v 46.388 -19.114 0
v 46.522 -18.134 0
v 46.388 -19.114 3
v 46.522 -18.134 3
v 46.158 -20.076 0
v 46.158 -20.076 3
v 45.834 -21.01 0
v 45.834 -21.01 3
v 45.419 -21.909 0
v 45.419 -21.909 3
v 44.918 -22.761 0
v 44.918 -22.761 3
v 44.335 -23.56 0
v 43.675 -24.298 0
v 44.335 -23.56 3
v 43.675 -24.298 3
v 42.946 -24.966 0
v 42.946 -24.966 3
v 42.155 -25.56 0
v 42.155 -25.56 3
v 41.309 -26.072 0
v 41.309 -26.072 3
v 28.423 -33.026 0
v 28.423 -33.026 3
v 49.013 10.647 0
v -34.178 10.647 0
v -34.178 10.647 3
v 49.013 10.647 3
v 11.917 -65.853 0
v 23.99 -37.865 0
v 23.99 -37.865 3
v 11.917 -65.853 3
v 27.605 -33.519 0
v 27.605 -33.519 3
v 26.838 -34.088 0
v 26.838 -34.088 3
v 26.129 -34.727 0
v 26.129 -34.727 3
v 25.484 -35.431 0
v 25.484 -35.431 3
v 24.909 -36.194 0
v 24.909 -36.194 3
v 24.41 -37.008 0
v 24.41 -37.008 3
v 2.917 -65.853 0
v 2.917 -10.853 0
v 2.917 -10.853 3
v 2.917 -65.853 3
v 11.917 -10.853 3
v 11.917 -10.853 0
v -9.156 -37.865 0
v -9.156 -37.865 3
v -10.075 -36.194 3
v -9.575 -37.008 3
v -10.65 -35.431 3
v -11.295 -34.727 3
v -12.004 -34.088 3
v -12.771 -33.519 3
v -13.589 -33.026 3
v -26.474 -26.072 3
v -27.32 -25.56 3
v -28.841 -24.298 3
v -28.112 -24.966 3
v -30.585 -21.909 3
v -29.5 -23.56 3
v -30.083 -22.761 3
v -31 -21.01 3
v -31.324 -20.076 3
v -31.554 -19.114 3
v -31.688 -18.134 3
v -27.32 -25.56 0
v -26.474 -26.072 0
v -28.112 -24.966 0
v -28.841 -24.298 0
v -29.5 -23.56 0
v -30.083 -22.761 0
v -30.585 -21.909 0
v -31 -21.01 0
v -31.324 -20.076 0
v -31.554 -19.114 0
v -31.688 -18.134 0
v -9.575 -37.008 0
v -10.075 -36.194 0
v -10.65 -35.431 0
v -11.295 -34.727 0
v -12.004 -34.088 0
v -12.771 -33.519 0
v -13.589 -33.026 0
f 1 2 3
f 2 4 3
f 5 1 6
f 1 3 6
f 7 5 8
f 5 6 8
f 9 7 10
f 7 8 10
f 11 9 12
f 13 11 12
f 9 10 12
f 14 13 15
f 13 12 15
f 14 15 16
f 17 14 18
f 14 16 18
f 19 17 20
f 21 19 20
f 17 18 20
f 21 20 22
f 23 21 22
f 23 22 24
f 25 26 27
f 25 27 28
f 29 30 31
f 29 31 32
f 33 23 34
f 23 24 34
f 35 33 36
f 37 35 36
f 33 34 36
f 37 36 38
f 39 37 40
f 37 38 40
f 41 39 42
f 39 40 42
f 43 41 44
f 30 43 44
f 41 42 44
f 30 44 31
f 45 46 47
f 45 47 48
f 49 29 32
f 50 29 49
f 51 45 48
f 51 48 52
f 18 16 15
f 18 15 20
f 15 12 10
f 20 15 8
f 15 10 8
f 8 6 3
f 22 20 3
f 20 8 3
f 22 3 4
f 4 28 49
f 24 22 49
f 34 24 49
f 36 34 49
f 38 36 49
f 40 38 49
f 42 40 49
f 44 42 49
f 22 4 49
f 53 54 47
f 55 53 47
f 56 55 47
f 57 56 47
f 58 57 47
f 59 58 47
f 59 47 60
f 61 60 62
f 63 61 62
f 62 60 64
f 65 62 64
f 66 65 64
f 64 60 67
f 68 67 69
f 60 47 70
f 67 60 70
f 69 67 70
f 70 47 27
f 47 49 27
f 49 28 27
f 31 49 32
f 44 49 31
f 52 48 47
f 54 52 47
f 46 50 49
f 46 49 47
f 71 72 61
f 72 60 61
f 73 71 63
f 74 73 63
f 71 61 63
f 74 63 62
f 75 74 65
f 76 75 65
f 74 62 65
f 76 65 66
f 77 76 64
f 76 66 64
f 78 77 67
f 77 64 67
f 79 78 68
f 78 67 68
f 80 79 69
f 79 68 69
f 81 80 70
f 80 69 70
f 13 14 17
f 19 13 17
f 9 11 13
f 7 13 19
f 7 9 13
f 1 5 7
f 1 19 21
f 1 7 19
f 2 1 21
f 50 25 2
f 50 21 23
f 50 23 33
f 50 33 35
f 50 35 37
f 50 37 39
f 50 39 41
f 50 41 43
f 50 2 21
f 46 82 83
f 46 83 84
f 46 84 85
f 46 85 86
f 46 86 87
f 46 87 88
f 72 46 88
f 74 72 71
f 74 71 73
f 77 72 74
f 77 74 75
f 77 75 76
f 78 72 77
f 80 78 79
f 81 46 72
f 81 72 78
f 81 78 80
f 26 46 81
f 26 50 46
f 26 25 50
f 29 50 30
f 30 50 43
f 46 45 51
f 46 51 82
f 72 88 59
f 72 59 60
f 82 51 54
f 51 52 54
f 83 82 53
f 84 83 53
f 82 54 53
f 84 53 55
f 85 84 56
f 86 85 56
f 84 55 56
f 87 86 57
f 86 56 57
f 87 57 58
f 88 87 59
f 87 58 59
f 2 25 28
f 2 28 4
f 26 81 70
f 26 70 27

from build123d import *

# Parameters (mm, degrees)
BOSS_EXTRU_1_DEPTH = 3
CONG_1_R           = 10


with BuildPart() as part:
    # Esquisse1 → Boss.-Extru.1 (new body)
    with BuildSketch(Plane.XY):
        Polygon((11.917194627, -65.85290432), (11.917194627, -10.85290432), (2.917194627, -10.85290432), (2.917194627, -65.85290432), (-10.53158391, -34.67577833), (-31.222461176, -23.509273139), (-34.178300785, 10.64709568), (49.012690039, 10.64709568), (46.05685043, -23.509273139), (25.365973164, -34.67577833), align=None)
    extrude(amount=BOSS_EXTRU_1_DEPTH)

    # Congé1
    cong_1_edges = [part.edges().sort_by_distance(p)[0] for p in [
        (-10.53158391, -34.67577833, 1.5),
        (-31.222461176, -23.509273139, 1.5),
        (46.05685043, -23.509273139, 1.5),
        (25.365973164, -34.67577833, 1.5),
    ]]
    fillet(cong_1_edges, radius=CONG_1_R)


solid = part.part
